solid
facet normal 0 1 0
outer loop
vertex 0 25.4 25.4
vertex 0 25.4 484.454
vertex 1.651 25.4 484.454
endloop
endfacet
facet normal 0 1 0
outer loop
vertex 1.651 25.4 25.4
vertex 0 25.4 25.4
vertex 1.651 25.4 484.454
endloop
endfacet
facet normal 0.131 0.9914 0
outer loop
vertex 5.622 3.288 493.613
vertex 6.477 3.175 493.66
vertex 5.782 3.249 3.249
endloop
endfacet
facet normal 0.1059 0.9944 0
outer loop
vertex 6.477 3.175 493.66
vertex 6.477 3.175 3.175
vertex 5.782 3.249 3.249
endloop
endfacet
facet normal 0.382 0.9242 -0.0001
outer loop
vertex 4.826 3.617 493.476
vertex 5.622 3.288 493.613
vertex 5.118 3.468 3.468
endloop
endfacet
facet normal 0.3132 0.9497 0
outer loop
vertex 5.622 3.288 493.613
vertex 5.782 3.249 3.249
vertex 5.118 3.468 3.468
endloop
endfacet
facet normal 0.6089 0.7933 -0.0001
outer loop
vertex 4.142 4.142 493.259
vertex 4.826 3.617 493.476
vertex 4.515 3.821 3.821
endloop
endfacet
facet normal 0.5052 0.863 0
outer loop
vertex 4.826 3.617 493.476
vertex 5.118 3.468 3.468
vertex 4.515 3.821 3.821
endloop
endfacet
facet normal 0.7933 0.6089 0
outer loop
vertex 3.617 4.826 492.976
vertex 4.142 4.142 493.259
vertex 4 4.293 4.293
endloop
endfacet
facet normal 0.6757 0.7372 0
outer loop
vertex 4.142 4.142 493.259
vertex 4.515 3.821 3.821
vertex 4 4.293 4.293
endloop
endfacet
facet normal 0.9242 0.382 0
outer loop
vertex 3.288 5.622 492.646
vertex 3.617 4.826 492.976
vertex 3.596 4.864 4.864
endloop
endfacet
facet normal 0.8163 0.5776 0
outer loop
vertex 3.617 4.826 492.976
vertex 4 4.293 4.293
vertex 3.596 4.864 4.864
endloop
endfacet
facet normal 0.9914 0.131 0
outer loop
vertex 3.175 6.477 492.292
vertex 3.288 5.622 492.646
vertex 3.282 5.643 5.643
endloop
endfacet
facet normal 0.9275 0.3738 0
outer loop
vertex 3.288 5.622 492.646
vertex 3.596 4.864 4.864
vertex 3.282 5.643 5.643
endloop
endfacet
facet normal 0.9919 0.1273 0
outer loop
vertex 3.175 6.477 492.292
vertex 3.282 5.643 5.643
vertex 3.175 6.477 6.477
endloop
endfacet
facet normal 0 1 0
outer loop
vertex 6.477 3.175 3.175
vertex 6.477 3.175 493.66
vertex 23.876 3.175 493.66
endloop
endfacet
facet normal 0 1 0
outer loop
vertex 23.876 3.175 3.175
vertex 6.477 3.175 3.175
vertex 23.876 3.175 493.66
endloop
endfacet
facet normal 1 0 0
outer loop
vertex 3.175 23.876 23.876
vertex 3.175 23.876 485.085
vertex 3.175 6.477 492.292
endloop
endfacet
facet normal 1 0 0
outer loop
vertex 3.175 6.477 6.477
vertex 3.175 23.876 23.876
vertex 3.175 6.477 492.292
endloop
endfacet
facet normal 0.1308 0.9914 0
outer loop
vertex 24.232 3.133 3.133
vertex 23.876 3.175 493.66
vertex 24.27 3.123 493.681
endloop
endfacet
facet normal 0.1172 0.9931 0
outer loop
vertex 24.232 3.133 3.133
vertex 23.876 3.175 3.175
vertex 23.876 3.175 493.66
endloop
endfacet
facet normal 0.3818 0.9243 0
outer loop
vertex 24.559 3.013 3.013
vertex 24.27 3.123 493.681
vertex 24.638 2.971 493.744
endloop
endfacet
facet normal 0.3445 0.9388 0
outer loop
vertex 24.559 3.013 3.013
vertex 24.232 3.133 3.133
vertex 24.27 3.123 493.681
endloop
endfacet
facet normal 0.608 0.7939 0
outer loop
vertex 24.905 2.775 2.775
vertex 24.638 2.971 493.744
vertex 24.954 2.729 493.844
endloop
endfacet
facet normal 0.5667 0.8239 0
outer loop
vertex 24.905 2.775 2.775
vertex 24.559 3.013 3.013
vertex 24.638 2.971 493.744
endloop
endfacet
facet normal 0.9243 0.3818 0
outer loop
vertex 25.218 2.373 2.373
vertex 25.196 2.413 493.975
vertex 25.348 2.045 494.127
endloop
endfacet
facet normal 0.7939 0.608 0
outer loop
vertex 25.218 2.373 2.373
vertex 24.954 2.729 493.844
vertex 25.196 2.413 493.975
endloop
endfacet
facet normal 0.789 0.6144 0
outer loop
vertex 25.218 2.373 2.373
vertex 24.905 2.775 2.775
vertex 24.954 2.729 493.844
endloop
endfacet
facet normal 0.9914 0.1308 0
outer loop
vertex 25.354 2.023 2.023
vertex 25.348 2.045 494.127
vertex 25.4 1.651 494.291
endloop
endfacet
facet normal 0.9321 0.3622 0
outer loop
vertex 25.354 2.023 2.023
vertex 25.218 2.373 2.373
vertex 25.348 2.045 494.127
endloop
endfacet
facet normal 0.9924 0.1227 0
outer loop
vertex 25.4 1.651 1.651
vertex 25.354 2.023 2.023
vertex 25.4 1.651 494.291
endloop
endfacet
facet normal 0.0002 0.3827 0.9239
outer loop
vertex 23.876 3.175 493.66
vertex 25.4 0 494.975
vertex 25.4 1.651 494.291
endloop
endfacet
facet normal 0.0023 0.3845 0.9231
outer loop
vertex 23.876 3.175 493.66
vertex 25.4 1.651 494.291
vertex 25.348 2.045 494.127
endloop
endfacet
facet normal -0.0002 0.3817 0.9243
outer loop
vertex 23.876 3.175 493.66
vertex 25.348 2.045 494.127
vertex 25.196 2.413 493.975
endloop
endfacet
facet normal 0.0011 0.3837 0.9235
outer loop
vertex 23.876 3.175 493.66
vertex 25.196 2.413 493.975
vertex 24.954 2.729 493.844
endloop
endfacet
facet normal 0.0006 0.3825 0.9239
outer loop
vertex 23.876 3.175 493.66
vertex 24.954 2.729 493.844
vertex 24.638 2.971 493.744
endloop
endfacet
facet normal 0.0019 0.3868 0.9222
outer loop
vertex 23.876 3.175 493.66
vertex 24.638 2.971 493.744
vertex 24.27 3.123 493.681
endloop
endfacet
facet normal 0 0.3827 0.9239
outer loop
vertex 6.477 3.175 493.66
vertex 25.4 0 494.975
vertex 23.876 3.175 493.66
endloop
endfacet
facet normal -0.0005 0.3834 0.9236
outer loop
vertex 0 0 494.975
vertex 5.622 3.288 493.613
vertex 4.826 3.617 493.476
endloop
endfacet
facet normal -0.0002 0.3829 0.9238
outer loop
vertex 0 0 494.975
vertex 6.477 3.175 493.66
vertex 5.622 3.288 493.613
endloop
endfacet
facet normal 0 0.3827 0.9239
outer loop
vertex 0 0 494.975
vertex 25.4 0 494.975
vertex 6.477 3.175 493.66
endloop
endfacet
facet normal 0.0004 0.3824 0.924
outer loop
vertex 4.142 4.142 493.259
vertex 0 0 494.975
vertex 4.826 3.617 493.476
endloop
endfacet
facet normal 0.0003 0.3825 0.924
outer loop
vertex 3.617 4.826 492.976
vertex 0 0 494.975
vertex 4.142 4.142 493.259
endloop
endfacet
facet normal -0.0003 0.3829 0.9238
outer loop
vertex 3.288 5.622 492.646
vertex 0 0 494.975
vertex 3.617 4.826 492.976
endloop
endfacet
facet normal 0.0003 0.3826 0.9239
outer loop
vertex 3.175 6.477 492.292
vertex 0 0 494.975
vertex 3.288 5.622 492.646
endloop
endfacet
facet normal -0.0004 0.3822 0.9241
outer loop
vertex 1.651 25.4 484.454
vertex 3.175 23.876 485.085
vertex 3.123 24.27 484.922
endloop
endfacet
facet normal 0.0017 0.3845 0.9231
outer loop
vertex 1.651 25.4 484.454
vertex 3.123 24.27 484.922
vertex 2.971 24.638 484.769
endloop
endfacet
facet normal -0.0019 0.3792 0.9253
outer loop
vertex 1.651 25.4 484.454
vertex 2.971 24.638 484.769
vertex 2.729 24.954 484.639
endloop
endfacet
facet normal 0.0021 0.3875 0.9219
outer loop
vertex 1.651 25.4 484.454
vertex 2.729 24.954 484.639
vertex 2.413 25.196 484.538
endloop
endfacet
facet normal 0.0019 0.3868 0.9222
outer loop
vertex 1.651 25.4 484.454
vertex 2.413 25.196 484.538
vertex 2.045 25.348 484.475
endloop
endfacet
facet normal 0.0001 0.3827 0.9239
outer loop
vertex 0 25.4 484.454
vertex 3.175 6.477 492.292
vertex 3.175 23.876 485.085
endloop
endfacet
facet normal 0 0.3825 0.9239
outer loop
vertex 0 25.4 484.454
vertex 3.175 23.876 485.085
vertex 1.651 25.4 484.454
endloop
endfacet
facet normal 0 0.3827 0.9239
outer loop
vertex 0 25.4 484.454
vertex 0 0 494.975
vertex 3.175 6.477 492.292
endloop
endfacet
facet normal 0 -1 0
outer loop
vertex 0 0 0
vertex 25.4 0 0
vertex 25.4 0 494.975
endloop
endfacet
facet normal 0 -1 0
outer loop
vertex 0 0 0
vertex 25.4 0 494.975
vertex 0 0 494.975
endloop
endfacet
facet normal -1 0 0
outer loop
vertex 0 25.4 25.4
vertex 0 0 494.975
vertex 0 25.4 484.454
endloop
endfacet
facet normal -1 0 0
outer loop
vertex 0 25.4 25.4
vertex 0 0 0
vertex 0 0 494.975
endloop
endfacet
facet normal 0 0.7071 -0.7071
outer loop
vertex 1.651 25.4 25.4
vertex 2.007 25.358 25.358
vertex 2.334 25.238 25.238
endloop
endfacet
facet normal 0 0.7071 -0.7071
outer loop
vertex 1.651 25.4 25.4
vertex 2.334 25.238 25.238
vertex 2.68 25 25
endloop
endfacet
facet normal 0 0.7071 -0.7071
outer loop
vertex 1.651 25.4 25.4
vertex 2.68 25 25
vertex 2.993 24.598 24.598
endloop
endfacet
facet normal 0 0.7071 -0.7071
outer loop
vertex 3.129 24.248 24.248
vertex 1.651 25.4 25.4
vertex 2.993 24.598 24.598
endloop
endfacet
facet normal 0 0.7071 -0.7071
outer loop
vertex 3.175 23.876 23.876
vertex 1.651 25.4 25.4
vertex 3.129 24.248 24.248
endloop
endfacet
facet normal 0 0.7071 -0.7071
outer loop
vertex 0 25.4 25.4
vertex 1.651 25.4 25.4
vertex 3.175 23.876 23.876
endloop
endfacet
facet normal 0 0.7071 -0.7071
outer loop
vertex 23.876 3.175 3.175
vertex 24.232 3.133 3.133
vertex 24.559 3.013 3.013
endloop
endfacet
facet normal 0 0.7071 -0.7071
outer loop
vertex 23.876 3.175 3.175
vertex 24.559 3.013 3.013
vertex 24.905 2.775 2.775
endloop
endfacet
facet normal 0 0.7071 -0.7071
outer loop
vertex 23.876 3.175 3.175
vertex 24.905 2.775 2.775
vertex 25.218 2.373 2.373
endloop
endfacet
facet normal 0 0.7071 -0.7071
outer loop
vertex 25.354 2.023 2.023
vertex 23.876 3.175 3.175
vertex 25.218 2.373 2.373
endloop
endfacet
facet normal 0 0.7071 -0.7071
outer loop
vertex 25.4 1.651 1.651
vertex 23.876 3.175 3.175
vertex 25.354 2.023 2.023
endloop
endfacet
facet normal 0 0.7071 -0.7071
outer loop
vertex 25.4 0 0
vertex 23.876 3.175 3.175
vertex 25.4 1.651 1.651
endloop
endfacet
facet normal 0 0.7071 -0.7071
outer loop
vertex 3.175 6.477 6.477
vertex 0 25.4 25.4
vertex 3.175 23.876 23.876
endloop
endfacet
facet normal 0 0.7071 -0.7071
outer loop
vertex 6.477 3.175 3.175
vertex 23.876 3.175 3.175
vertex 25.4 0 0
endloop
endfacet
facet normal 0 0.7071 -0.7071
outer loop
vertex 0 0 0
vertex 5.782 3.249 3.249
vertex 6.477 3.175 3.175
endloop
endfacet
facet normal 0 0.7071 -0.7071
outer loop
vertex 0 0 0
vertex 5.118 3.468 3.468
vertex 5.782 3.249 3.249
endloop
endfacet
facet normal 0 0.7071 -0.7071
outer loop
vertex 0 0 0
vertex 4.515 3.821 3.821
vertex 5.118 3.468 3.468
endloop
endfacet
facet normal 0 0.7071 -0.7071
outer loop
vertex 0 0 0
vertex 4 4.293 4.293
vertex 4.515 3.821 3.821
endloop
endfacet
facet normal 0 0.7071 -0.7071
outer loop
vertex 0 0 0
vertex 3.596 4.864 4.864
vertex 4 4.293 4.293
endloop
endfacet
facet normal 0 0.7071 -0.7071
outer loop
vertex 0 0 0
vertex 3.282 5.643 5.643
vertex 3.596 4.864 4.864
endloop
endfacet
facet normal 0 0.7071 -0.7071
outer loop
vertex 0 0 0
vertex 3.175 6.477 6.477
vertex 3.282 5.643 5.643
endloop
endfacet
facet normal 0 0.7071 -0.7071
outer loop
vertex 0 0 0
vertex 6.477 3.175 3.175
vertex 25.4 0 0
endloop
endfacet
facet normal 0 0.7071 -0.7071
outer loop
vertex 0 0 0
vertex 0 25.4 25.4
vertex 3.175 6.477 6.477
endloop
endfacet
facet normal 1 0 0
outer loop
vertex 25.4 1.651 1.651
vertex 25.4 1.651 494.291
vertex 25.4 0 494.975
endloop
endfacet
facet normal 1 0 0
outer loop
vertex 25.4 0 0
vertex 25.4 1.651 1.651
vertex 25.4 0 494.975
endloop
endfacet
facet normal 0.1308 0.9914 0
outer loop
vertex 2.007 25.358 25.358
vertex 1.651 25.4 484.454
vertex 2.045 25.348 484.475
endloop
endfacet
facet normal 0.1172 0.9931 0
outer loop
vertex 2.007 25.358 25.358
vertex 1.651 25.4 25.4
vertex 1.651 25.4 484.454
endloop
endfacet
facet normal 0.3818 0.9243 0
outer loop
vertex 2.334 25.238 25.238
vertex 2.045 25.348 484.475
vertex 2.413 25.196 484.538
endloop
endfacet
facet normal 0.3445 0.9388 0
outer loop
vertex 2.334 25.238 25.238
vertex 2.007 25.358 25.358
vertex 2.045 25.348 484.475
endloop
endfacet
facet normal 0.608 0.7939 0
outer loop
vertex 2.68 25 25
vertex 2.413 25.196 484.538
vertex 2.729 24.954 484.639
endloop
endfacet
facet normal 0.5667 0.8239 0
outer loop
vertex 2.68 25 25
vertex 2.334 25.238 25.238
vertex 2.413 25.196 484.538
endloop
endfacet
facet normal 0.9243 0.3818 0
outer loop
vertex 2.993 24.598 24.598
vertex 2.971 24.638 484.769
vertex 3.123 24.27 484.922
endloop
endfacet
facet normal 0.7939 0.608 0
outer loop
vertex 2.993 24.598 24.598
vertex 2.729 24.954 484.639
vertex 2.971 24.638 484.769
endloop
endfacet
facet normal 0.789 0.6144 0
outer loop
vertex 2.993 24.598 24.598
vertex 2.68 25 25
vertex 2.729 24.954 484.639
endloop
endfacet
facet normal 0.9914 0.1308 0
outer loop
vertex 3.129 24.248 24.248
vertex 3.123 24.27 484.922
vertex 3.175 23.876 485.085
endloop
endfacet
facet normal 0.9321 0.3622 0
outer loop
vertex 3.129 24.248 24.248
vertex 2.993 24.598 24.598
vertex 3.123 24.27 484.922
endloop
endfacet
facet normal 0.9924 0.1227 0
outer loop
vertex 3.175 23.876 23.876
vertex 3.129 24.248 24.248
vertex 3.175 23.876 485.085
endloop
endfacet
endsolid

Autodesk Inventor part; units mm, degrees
ref_plane "Start Plane" through (0, 0, 0) normal (0, 0, 1) x (1, 0, 0)
ref_plane "End Plane" through (0, 0, 494.9747) normal (0, 0, 1) x (1, 0, 0)
sketch "Sketch" plane through (0, 0, 0) normal (0, 0, 1) x (1, 0, 0)
  line L0 (25.4, 0) -> (0, 0)
  line L1 (0, 0) -> (0, 25.4)
  line L2 (0, 25.4) -> (1.651, 25.4)
  line L3 (3.175, 23.876) -> (3.175, 6.477)
  line L4 (6.477, 3.175) -> (23.876, 3.175)
  line L5 (25.4, 1.651) -> (25.4, 0)
  line L6 (0, -11.0414) -> (0, 31.5385) construction
  line L7 (-11.0414, 0) -> (31.5385, 0) construction
  arc A0 (3.175, 6.477) -> (6.477, 3.175) centre (6.477, 6.477) ccw
  arc A1 (3.175, 23.876) -> (1.651, 25.4) centre (1.651, 23.876) ccw
  arc A2 (25.4, 1.651) -> (23.876, 3.175) centre (23.876, 1.651) ccw
  line L8 (0, 40.0545) -> (0, -19.5574) construction
  line L9 (-19.5574, 0) -> (40.0545, 0) construction
  point P0 (3.175, 25.4)
  point P1 (3.175, 3.175)
  point P2 (25.4, 3.175)
  dimension "d0" = 25.4
  dimension "d1" = 25.4
  dimension "d2" = 3.175
  dimension "d3" = 3.175
  dimension "d10" = 0
  dimension "d11" = 0
  dimension "d14" = 3.302
  dimension "d15" = 1.524
extrude "Body" add sketch "Sketch" along normal up to surface (494.9747 mm away) from surface at 0
sketch "Sketch3" plane through (0, 0, 0) normal (0, 0, 1) x (1, 0, 0)
  line L0 (0, 0) -> (10, 0)
ref_plane "Work Plane3" through (0, 0, 0) normal (0, -1, 0) x (1, 0, 0)
ref_plane "Work Plane4" through (12.7, 0, 494.9747) normal (0, 0.3827, 0.9239) x (1, 0, 0)
split "Split1" plane through (12.7, 0, 494.9747) removes the side toward (0, 0.3827, 0.9239)
ref_plane "Work Plane5" through (0, 0, 0) normal (0, 0.7071, -0.7071) x (1, 0, 0)
split "Split2" plane through (0, 0, 0) removes the side toward (0, 0.7071, -0.7071)
sketch "Sketch4" plane through (0, 0, 0) normal (0, -1, 0) x (1, 0, 0)
  line L0 (-2, 0) -> (12, 0) projected
  line L1 (-2, 494.9747) -> (12, 494.9747) projected
  dimension "d17" = 494.9747
equation "\"d0\" = G_H"
equation "\"d1\" = G_H"
equation "\"d2\" = G_T"
equation "\"d3\" = G_T"
equation "\"d14\" = G_IR"
equation "\"d15\" = G_ER"
equation "\"d4\" = G_L"
equation "\"G_H\" = 25.4"
equation "\"G_T\" = 3.175"
equation "\"G_ER\" = 1.524"
equation "\"G_IR\" = 3.302"
equation "\"G_L\" = d17"
equation "\"ex\" = 0"
equation "\"G_OFFSET_START\" = 0"
equation "\"G_OFFSET_END\" = 0"
equation "\"d13\" = G_OFFSET_END + B_L"
equation "\"B_L\" = 494.97475"
properties part number "AISC - L 1 x 1 x 1/8 - 19.487" material "Steel, Mild"
